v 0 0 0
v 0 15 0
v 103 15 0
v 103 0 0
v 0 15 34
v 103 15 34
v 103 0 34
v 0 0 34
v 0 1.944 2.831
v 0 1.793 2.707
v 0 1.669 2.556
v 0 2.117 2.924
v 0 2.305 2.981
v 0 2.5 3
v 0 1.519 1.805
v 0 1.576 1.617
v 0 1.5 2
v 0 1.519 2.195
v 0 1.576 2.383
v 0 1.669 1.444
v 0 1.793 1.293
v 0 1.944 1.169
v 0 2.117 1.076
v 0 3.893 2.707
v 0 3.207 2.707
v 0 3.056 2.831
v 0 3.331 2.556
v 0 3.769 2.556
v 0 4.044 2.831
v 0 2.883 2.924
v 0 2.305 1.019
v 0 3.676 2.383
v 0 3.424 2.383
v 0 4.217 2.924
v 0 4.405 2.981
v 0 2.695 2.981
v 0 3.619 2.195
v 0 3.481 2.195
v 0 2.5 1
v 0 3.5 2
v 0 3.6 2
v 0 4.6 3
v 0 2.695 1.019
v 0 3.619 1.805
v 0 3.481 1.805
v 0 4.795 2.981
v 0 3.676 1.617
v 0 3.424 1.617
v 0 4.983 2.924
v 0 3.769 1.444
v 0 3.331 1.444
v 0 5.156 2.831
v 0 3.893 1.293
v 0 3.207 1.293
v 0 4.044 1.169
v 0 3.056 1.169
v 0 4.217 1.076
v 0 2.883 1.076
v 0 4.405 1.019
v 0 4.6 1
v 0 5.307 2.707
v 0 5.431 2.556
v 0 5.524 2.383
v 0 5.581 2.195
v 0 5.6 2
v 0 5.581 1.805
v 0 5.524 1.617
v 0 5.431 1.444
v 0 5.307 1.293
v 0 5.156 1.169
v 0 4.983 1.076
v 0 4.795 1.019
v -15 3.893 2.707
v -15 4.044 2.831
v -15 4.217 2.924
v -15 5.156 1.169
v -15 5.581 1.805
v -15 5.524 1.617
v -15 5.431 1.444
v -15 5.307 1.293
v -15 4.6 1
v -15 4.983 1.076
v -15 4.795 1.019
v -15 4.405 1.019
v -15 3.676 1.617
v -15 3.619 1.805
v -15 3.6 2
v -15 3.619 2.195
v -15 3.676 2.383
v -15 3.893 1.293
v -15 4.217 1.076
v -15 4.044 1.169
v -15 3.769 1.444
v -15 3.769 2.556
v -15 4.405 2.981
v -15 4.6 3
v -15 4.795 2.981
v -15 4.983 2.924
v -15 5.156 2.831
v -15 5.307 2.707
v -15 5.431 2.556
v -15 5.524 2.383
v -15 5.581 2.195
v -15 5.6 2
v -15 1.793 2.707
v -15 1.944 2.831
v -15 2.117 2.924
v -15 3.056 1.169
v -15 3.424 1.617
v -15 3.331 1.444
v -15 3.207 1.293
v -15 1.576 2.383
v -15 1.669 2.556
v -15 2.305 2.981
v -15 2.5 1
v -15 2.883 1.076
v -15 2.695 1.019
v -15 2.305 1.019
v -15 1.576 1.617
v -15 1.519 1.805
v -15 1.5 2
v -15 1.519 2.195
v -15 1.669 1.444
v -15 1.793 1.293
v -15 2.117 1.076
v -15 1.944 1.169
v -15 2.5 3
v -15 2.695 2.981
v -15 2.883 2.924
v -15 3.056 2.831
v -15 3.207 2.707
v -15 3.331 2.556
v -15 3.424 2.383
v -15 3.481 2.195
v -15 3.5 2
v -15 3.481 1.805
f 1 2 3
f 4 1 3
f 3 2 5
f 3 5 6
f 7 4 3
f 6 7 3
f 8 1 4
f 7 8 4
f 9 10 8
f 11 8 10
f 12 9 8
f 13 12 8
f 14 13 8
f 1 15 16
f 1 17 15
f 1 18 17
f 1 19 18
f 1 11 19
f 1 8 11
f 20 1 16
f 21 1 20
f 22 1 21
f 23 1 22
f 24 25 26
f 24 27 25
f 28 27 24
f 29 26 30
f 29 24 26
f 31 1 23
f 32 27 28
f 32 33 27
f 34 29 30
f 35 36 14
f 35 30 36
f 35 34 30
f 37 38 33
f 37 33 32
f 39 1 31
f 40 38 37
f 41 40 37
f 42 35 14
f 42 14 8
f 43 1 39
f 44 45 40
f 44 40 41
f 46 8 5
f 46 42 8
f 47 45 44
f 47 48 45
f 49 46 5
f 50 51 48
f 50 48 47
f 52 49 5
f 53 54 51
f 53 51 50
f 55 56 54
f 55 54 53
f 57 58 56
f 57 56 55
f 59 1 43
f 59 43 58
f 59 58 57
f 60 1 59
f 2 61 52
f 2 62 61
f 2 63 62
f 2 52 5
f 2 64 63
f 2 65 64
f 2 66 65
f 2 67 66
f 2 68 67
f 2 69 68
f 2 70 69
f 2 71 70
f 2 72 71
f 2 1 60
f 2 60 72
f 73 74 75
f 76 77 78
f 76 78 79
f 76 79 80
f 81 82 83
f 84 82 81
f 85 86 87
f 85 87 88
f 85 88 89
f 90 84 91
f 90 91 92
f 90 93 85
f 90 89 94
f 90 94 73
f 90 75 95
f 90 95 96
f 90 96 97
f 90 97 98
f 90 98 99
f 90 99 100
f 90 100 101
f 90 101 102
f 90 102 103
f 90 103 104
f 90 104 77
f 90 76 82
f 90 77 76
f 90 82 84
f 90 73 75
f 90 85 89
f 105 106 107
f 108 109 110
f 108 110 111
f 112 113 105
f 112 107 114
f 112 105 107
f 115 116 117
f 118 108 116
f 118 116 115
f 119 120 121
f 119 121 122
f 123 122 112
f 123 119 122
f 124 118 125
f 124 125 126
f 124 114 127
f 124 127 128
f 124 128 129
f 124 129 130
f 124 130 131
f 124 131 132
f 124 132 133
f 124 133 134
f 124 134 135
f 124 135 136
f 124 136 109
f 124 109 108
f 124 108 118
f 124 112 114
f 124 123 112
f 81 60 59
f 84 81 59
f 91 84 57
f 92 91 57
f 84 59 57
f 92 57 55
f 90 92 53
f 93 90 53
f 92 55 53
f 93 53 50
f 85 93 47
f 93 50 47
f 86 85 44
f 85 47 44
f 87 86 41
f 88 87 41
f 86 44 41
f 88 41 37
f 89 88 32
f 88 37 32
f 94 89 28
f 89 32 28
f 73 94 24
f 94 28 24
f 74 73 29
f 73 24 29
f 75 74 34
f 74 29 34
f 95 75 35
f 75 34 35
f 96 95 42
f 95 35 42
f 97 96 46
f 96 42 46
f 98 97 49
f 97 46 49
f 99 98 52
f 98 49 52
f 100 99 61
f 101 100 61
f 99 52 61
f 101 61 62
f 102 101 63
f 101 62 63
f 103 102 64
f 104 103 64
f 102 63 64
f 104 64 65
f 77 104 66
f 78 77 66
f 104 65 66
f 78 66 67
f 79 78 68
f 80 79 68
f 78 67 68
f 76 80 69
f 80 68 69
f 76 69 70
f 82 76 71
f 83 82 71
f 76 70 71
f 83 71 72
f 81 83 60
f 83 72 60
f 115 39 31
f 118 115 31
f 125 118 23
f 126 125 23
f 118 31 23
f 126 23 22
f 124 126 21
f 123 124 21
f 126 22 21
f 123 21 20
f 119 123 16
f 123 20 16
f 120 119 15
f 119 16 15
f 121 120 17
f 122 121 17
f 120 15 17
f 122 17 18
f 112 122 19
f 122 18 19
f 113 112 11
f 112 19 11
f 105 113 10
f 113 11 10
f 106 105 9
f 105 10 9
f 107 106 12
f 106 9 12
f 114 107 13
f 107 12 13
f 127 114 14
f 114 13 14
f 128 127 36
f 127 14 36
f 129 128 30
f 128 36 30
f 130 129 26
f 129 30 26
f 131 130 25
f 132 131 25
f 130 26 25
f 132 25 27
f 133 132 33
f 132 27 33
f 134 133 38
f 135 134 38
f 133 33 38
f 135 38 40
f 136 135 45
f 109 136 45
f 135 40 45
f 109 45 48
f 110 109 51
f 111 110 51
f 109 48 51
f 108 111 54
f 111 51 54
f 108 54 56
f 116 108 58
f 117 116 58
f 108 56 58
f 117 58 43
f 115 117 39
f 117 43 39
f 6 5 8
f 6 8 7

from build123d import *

# Parameters (mm, degrees)
SKETCH1_W           = 103
SKETCH1_H           = 15
BOSS_EXTRUDE1_DEPTH = 34
SKETCH2_R           = 1
BOSS_EXTRUDE2_DEPTH = 15


with BuildPart() as part:
    # Sketch1 → Boss-Extrude1 (new body)
    with BuildSketch(Plane.XY):
        with Locations((51.5, 7.5)):
            Rectangle(SKETCH1_W, SKETCH1_H)
    extrude(amount=BOSS_EXTRUDE1_DEPTH)

    # Sketch2 → Boss-Extrude2 (add)
    with BuildSketch(Plane.ZY):
        with Locations(Location((2, 2.5, 0), (0, 0, 180))):
            Circle(SKETCH2_R)
        with Locations(Location((2, 4.6, 0), (0, 0, 180))):
            Circle(SKETCH2_R)
    extrude(amount=BOSS_EXTRUDE2_DEPTH)


solid = part.part
